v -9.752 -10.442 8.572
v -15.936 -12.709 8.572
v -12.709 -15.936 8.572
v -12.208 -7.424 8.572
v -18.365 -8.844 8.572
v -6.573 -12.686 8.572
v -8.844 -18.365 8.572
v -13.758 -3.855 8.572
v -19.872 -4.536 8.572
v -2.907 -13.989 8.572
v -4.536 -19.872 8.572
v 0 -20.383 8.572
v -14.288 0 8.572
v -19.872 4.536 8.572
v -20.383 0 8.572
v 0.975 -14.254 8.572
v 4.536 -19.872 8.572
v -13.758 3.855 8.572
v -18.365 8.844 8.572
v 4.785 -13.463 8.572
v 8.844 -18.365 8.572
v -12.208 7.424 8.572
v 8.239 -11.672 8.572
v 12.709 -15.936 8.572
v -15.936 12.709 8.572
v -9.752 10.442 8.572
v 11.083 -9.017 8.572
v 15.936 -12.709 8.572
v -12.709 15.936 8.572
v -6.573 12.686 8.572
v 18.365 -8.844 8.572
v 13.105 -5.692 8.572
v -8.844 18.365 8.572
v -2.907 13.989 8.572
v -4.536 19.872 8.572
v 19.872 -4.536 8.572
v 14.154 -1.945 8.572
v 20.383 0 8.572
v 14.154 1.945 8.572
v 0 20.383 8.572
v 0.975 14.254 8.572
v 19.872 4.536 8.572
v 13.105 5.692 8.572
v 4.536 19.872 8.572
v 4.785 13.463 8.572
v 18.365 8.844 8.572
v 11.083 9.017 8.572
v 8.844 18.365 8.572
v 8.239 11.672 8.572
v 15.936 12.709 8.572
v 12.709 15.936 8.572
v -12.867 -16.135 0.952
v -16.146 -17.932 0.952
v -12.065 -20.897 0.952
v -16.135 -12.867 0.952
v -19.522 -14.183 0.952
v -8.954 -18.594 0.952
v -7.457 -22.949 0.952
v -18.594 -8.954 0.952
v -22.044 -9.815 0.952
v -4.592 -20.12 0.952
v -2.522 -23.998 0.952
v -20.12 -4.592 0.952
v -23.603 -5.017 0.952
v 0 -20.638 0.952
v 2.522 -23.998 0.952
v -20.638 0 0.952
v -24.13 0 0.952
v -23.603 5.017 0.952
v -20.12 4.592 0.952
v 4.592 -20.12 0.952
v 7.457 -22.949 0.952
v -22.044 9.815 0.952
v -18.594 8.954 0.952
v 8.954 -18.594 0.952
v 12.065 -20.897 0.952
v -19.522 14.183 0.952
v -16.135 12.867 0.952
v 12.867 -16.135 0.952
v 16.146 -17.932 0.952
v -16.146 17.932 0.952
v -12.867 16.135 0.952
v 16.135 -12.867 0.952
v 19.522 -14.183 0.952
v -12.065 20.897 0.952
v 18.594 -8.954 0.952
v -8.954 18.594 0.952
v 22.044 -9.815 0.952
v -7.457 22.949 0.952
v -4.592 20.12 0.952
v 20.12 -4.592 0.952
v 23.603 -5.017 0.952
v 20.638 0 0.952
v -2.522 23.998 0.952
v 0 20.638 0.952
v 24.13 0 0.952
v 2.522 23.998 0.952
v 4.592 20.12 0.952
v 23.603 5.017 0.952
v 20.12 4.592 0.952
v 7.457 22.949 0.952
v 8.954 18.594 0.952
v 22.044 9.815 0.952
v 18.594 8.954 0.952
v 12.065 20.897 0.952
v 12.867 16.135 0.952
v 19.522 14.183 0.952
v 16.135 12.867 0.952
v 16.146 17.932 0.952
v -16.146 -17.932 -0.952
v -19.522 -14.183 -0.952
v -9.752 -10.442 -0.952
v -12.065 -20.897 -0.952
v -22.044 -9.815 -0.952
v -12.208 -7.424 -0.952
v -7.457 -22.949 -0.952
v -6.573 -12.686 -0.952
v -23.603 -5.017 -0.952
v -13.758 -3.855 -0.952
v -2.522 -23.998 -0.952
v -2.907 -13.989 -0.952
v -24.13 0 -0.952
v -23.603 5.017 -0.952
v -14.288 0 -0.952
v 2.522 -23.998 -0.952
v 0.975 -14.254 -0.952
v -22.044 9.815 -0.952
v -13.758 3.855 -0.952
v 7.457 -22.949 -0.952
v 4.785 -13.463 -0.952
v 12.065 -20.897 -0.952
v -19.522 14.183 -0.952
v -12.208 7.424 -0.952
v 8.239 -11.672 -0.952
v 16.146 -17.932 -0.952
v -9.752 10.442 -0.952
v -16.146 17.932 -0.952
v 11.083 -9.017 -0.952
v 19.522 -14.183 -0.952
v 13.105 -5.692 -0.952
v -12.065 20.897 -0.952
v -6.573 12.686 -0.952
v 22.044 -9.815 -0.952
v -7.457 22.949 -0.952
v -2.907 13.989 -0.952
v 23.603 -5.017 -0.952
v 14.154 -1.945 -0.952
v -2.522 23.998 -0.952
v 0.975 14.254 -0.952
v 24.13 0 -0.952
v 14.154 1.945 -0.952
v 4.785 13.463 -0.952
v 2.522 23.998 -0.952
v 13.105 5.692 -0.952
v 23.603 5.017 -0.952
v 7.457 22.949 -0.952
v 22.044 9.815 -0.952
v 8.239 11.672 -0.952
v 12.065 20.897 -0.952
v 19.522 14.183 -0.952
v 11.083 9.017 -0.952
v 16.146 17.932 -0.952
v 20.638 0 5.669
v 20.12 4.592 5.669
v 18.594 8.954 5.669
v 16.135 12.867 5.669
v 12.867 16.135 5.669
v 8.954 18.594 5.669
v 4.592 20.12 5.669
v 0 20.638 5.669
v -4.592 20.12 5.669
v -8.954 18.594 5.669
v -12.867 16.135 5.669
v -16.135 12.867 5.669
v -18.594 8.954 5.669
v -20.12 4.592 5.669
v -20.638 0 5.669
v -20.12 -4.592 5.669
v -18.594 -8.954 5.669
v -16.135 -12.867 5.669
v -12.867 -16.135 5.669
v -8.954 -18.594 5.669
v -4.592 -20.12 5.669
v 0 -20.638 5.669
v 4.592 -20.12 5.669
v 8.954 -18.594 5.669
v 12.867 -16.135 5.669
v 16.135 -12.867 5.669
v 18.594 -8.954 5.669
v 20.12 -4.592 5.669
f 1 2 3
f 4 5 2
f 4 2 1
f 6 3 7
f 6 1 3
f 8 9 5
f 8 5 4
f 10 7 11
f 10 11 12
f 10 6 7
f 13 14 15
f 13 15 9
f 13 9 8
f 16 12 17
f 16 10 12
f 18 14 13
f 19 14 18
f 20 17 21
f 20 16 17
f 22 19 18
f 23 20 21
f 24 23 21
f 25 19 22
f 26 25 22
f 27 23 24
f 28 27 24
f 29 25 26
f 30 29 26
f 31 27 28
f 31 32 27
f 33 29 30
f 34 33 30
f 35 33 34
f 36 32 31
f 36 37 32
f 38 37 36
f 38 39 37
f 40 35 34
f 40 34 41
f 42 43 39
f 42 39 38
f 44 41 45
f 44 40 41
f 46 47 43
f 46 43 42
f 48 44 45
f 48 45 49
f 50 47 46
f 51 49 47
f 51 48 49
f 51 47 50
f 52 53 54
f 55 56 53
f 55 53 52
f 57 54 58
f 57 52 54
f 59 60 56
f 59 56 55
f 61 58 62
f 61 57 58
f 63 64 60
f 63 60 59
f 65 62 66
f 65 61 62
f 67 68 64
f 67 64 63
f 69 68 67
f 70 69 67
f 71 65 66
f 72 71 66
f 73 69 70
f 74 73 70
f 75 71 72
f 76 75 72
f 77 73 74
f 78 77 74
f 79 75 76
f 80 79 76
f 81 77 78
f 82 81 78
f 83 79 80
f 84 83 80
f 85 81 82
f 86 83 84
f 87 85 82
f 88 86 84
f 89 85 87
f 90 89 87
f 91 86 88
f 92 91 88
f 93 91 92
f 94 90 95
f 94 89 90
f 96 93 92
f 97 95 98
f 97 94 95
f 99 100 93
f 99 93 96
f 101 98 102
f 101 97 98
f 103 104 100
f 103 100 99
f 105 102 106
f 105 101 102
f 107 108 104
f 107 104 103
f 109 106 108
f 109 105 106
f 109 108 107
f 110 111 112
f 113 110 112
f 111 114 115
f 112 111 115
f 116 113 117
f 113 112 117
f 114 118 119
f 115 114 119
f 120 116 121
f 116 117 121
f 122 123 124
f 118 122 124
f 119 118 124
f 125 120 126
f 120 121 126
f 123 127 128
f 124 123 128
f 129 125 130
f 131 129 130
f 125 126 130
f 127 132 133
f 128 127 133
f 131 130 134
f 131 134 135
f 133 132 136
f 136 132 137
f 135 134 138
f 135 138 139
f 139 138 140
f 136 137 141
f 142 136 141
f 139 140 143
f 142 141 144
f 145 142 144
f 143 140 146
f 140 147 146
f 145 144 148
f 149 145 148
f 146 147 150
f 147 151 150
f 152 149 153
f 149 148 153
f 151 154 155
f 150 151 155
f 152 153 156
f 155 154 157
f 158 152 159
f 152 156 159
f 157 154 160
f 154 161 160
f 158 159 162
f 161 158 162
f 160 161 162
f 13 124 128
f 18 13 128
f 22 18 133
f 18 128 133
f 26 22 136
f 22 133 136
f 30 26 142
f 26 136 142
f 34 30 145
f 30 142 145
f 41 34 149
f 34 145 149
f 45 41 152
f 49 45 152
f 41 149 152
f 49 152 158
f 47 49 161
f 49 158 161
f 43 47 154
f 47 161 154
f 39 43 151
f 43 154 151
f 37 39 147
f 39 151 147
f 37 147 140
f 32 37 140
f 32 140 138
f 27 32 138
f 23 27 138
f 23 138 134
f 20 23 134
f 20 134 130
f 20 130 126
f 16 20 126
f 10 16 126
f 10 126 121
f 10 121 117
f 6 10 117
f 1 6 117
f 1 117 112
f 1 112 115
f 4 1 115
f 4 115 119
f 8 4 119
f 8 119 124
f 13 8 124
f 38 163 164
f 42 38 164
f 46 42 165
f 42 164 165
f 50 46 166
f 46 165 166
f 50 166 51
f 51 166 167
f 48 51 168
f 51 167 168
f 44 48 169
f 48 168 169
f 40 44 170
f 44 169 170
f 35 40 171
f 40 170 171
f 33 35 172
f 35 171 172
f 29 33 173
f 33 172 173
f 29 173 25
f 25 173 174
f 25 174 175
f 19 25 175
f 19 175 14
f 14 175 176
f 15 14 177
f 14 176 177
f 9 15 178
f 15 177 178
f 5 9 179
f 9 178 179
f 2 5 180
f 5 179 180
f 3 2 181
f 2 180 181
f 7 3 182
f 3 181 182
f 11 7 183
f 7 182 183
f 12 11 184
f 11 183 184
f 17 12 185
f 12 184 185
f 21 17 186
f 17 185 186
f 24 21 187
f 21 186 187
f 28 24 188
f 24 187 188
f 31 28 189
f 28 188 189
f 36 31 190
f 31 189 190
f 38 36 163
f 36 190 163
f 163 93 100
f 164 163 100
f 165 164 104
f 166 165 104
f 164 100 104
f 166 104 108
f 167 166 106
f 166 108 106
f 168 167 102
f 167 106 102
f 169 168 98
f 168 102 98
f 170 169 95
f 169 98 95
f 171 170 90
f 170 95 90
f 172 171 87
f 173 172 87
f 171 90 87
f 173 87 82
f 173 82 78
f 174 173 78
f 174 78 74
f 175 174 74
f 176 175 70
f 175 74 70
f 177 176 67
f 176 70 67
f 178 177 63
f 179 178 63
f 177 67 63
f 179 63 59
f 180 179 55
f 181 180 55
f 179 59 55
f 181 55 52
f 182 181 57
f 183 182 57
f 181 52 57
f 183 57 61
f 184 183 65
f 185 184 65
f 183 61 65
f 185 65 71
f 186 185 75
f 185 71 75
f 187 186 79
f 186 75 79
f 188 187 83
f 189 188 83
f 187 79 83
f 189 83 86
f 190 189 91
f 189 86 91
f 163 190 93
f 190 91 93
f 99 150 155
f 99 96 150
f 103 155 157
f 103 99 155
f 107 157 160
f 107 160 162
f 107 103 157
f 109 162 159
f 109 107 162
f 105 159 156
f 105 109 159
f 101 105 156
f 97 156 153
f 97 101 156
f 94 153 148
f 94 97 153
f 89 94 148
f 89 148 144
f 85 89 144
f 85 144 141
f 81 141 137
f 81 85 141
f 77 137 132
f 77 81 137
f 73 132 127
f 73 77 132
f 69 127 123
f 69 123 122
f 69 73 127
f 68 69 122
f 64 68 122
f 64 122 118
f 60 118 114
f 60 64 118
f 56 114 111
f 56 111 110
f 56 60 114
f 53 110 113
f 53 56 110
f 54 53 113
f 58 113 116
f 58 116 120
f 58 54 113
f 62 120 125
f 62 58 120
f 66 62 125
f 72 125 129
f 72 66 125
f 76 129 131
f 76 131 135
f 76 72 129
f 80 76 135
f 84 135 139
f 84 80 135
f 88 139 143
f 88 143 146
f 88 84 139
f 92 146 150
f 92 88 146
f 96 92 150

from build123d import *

# Parameters (mm, degrees)
SKETCH1_R           = 24.13
BOSS_EXTRUDE1_DEPTH = 0.9525
SKETCH2_R           = 20.6375
BOSS_EXTRUDE2_DEPTH = 7.62
SKETCH4_R           = 14.2875
CUT_EXTRUDE1_DEPTH  = 10.525
CHAMFER1_SIZE       = 0.254
CHAMFER1_SIZE2      = 2.903233285


with BuildPart() as part:
    # Sketch1 → Boss-Extrude1 (new body, symmetric)
    with BuildSketch(Plane.XY):
        Circle(SKETCH1_R)
    extrude(amount=BOSS_EXTRUDE1_DEPTH, both=True)

    # Sketch2 → Boss-Extrude2 (add)
    with BuildSketch(Plane.XY.offset(0.9525)):
        Circle(SKETCH2_R)
    extrude(amount=BOSS_EXTRUDE2_DEPTH)

    # Sketch4 → Cut-Extrude1 (cut, through all)
    with BuildSketch(Plane(origin=(0, 0, -0.9525), x_dir=(-1, 0, 0), z_dir=(0, 0, -1))):
        Circle(SKETCH4_R)
    extrude(amount=-CUT_EXTRUDE1_DEPTH, mode=Mode.SUBTRACT)

    # Chamfer1
    chamfer1_edges = [part.edges().sort_by_distance(p)[0] for p in [
        (-20.6375, 0, 8.5725),
    ]]
    chamfer1_side = [part.faces().sort_by_distance(p)[0] for p in [
        (-20.053783352, 0, 8.5725),
    ]]
    chamfer(chamfer1_edges, length=CHAMFER1_SIZE, length2=CHAMFER1_SIZE2, reference=chamfer1_side[0])


solid = part.part
